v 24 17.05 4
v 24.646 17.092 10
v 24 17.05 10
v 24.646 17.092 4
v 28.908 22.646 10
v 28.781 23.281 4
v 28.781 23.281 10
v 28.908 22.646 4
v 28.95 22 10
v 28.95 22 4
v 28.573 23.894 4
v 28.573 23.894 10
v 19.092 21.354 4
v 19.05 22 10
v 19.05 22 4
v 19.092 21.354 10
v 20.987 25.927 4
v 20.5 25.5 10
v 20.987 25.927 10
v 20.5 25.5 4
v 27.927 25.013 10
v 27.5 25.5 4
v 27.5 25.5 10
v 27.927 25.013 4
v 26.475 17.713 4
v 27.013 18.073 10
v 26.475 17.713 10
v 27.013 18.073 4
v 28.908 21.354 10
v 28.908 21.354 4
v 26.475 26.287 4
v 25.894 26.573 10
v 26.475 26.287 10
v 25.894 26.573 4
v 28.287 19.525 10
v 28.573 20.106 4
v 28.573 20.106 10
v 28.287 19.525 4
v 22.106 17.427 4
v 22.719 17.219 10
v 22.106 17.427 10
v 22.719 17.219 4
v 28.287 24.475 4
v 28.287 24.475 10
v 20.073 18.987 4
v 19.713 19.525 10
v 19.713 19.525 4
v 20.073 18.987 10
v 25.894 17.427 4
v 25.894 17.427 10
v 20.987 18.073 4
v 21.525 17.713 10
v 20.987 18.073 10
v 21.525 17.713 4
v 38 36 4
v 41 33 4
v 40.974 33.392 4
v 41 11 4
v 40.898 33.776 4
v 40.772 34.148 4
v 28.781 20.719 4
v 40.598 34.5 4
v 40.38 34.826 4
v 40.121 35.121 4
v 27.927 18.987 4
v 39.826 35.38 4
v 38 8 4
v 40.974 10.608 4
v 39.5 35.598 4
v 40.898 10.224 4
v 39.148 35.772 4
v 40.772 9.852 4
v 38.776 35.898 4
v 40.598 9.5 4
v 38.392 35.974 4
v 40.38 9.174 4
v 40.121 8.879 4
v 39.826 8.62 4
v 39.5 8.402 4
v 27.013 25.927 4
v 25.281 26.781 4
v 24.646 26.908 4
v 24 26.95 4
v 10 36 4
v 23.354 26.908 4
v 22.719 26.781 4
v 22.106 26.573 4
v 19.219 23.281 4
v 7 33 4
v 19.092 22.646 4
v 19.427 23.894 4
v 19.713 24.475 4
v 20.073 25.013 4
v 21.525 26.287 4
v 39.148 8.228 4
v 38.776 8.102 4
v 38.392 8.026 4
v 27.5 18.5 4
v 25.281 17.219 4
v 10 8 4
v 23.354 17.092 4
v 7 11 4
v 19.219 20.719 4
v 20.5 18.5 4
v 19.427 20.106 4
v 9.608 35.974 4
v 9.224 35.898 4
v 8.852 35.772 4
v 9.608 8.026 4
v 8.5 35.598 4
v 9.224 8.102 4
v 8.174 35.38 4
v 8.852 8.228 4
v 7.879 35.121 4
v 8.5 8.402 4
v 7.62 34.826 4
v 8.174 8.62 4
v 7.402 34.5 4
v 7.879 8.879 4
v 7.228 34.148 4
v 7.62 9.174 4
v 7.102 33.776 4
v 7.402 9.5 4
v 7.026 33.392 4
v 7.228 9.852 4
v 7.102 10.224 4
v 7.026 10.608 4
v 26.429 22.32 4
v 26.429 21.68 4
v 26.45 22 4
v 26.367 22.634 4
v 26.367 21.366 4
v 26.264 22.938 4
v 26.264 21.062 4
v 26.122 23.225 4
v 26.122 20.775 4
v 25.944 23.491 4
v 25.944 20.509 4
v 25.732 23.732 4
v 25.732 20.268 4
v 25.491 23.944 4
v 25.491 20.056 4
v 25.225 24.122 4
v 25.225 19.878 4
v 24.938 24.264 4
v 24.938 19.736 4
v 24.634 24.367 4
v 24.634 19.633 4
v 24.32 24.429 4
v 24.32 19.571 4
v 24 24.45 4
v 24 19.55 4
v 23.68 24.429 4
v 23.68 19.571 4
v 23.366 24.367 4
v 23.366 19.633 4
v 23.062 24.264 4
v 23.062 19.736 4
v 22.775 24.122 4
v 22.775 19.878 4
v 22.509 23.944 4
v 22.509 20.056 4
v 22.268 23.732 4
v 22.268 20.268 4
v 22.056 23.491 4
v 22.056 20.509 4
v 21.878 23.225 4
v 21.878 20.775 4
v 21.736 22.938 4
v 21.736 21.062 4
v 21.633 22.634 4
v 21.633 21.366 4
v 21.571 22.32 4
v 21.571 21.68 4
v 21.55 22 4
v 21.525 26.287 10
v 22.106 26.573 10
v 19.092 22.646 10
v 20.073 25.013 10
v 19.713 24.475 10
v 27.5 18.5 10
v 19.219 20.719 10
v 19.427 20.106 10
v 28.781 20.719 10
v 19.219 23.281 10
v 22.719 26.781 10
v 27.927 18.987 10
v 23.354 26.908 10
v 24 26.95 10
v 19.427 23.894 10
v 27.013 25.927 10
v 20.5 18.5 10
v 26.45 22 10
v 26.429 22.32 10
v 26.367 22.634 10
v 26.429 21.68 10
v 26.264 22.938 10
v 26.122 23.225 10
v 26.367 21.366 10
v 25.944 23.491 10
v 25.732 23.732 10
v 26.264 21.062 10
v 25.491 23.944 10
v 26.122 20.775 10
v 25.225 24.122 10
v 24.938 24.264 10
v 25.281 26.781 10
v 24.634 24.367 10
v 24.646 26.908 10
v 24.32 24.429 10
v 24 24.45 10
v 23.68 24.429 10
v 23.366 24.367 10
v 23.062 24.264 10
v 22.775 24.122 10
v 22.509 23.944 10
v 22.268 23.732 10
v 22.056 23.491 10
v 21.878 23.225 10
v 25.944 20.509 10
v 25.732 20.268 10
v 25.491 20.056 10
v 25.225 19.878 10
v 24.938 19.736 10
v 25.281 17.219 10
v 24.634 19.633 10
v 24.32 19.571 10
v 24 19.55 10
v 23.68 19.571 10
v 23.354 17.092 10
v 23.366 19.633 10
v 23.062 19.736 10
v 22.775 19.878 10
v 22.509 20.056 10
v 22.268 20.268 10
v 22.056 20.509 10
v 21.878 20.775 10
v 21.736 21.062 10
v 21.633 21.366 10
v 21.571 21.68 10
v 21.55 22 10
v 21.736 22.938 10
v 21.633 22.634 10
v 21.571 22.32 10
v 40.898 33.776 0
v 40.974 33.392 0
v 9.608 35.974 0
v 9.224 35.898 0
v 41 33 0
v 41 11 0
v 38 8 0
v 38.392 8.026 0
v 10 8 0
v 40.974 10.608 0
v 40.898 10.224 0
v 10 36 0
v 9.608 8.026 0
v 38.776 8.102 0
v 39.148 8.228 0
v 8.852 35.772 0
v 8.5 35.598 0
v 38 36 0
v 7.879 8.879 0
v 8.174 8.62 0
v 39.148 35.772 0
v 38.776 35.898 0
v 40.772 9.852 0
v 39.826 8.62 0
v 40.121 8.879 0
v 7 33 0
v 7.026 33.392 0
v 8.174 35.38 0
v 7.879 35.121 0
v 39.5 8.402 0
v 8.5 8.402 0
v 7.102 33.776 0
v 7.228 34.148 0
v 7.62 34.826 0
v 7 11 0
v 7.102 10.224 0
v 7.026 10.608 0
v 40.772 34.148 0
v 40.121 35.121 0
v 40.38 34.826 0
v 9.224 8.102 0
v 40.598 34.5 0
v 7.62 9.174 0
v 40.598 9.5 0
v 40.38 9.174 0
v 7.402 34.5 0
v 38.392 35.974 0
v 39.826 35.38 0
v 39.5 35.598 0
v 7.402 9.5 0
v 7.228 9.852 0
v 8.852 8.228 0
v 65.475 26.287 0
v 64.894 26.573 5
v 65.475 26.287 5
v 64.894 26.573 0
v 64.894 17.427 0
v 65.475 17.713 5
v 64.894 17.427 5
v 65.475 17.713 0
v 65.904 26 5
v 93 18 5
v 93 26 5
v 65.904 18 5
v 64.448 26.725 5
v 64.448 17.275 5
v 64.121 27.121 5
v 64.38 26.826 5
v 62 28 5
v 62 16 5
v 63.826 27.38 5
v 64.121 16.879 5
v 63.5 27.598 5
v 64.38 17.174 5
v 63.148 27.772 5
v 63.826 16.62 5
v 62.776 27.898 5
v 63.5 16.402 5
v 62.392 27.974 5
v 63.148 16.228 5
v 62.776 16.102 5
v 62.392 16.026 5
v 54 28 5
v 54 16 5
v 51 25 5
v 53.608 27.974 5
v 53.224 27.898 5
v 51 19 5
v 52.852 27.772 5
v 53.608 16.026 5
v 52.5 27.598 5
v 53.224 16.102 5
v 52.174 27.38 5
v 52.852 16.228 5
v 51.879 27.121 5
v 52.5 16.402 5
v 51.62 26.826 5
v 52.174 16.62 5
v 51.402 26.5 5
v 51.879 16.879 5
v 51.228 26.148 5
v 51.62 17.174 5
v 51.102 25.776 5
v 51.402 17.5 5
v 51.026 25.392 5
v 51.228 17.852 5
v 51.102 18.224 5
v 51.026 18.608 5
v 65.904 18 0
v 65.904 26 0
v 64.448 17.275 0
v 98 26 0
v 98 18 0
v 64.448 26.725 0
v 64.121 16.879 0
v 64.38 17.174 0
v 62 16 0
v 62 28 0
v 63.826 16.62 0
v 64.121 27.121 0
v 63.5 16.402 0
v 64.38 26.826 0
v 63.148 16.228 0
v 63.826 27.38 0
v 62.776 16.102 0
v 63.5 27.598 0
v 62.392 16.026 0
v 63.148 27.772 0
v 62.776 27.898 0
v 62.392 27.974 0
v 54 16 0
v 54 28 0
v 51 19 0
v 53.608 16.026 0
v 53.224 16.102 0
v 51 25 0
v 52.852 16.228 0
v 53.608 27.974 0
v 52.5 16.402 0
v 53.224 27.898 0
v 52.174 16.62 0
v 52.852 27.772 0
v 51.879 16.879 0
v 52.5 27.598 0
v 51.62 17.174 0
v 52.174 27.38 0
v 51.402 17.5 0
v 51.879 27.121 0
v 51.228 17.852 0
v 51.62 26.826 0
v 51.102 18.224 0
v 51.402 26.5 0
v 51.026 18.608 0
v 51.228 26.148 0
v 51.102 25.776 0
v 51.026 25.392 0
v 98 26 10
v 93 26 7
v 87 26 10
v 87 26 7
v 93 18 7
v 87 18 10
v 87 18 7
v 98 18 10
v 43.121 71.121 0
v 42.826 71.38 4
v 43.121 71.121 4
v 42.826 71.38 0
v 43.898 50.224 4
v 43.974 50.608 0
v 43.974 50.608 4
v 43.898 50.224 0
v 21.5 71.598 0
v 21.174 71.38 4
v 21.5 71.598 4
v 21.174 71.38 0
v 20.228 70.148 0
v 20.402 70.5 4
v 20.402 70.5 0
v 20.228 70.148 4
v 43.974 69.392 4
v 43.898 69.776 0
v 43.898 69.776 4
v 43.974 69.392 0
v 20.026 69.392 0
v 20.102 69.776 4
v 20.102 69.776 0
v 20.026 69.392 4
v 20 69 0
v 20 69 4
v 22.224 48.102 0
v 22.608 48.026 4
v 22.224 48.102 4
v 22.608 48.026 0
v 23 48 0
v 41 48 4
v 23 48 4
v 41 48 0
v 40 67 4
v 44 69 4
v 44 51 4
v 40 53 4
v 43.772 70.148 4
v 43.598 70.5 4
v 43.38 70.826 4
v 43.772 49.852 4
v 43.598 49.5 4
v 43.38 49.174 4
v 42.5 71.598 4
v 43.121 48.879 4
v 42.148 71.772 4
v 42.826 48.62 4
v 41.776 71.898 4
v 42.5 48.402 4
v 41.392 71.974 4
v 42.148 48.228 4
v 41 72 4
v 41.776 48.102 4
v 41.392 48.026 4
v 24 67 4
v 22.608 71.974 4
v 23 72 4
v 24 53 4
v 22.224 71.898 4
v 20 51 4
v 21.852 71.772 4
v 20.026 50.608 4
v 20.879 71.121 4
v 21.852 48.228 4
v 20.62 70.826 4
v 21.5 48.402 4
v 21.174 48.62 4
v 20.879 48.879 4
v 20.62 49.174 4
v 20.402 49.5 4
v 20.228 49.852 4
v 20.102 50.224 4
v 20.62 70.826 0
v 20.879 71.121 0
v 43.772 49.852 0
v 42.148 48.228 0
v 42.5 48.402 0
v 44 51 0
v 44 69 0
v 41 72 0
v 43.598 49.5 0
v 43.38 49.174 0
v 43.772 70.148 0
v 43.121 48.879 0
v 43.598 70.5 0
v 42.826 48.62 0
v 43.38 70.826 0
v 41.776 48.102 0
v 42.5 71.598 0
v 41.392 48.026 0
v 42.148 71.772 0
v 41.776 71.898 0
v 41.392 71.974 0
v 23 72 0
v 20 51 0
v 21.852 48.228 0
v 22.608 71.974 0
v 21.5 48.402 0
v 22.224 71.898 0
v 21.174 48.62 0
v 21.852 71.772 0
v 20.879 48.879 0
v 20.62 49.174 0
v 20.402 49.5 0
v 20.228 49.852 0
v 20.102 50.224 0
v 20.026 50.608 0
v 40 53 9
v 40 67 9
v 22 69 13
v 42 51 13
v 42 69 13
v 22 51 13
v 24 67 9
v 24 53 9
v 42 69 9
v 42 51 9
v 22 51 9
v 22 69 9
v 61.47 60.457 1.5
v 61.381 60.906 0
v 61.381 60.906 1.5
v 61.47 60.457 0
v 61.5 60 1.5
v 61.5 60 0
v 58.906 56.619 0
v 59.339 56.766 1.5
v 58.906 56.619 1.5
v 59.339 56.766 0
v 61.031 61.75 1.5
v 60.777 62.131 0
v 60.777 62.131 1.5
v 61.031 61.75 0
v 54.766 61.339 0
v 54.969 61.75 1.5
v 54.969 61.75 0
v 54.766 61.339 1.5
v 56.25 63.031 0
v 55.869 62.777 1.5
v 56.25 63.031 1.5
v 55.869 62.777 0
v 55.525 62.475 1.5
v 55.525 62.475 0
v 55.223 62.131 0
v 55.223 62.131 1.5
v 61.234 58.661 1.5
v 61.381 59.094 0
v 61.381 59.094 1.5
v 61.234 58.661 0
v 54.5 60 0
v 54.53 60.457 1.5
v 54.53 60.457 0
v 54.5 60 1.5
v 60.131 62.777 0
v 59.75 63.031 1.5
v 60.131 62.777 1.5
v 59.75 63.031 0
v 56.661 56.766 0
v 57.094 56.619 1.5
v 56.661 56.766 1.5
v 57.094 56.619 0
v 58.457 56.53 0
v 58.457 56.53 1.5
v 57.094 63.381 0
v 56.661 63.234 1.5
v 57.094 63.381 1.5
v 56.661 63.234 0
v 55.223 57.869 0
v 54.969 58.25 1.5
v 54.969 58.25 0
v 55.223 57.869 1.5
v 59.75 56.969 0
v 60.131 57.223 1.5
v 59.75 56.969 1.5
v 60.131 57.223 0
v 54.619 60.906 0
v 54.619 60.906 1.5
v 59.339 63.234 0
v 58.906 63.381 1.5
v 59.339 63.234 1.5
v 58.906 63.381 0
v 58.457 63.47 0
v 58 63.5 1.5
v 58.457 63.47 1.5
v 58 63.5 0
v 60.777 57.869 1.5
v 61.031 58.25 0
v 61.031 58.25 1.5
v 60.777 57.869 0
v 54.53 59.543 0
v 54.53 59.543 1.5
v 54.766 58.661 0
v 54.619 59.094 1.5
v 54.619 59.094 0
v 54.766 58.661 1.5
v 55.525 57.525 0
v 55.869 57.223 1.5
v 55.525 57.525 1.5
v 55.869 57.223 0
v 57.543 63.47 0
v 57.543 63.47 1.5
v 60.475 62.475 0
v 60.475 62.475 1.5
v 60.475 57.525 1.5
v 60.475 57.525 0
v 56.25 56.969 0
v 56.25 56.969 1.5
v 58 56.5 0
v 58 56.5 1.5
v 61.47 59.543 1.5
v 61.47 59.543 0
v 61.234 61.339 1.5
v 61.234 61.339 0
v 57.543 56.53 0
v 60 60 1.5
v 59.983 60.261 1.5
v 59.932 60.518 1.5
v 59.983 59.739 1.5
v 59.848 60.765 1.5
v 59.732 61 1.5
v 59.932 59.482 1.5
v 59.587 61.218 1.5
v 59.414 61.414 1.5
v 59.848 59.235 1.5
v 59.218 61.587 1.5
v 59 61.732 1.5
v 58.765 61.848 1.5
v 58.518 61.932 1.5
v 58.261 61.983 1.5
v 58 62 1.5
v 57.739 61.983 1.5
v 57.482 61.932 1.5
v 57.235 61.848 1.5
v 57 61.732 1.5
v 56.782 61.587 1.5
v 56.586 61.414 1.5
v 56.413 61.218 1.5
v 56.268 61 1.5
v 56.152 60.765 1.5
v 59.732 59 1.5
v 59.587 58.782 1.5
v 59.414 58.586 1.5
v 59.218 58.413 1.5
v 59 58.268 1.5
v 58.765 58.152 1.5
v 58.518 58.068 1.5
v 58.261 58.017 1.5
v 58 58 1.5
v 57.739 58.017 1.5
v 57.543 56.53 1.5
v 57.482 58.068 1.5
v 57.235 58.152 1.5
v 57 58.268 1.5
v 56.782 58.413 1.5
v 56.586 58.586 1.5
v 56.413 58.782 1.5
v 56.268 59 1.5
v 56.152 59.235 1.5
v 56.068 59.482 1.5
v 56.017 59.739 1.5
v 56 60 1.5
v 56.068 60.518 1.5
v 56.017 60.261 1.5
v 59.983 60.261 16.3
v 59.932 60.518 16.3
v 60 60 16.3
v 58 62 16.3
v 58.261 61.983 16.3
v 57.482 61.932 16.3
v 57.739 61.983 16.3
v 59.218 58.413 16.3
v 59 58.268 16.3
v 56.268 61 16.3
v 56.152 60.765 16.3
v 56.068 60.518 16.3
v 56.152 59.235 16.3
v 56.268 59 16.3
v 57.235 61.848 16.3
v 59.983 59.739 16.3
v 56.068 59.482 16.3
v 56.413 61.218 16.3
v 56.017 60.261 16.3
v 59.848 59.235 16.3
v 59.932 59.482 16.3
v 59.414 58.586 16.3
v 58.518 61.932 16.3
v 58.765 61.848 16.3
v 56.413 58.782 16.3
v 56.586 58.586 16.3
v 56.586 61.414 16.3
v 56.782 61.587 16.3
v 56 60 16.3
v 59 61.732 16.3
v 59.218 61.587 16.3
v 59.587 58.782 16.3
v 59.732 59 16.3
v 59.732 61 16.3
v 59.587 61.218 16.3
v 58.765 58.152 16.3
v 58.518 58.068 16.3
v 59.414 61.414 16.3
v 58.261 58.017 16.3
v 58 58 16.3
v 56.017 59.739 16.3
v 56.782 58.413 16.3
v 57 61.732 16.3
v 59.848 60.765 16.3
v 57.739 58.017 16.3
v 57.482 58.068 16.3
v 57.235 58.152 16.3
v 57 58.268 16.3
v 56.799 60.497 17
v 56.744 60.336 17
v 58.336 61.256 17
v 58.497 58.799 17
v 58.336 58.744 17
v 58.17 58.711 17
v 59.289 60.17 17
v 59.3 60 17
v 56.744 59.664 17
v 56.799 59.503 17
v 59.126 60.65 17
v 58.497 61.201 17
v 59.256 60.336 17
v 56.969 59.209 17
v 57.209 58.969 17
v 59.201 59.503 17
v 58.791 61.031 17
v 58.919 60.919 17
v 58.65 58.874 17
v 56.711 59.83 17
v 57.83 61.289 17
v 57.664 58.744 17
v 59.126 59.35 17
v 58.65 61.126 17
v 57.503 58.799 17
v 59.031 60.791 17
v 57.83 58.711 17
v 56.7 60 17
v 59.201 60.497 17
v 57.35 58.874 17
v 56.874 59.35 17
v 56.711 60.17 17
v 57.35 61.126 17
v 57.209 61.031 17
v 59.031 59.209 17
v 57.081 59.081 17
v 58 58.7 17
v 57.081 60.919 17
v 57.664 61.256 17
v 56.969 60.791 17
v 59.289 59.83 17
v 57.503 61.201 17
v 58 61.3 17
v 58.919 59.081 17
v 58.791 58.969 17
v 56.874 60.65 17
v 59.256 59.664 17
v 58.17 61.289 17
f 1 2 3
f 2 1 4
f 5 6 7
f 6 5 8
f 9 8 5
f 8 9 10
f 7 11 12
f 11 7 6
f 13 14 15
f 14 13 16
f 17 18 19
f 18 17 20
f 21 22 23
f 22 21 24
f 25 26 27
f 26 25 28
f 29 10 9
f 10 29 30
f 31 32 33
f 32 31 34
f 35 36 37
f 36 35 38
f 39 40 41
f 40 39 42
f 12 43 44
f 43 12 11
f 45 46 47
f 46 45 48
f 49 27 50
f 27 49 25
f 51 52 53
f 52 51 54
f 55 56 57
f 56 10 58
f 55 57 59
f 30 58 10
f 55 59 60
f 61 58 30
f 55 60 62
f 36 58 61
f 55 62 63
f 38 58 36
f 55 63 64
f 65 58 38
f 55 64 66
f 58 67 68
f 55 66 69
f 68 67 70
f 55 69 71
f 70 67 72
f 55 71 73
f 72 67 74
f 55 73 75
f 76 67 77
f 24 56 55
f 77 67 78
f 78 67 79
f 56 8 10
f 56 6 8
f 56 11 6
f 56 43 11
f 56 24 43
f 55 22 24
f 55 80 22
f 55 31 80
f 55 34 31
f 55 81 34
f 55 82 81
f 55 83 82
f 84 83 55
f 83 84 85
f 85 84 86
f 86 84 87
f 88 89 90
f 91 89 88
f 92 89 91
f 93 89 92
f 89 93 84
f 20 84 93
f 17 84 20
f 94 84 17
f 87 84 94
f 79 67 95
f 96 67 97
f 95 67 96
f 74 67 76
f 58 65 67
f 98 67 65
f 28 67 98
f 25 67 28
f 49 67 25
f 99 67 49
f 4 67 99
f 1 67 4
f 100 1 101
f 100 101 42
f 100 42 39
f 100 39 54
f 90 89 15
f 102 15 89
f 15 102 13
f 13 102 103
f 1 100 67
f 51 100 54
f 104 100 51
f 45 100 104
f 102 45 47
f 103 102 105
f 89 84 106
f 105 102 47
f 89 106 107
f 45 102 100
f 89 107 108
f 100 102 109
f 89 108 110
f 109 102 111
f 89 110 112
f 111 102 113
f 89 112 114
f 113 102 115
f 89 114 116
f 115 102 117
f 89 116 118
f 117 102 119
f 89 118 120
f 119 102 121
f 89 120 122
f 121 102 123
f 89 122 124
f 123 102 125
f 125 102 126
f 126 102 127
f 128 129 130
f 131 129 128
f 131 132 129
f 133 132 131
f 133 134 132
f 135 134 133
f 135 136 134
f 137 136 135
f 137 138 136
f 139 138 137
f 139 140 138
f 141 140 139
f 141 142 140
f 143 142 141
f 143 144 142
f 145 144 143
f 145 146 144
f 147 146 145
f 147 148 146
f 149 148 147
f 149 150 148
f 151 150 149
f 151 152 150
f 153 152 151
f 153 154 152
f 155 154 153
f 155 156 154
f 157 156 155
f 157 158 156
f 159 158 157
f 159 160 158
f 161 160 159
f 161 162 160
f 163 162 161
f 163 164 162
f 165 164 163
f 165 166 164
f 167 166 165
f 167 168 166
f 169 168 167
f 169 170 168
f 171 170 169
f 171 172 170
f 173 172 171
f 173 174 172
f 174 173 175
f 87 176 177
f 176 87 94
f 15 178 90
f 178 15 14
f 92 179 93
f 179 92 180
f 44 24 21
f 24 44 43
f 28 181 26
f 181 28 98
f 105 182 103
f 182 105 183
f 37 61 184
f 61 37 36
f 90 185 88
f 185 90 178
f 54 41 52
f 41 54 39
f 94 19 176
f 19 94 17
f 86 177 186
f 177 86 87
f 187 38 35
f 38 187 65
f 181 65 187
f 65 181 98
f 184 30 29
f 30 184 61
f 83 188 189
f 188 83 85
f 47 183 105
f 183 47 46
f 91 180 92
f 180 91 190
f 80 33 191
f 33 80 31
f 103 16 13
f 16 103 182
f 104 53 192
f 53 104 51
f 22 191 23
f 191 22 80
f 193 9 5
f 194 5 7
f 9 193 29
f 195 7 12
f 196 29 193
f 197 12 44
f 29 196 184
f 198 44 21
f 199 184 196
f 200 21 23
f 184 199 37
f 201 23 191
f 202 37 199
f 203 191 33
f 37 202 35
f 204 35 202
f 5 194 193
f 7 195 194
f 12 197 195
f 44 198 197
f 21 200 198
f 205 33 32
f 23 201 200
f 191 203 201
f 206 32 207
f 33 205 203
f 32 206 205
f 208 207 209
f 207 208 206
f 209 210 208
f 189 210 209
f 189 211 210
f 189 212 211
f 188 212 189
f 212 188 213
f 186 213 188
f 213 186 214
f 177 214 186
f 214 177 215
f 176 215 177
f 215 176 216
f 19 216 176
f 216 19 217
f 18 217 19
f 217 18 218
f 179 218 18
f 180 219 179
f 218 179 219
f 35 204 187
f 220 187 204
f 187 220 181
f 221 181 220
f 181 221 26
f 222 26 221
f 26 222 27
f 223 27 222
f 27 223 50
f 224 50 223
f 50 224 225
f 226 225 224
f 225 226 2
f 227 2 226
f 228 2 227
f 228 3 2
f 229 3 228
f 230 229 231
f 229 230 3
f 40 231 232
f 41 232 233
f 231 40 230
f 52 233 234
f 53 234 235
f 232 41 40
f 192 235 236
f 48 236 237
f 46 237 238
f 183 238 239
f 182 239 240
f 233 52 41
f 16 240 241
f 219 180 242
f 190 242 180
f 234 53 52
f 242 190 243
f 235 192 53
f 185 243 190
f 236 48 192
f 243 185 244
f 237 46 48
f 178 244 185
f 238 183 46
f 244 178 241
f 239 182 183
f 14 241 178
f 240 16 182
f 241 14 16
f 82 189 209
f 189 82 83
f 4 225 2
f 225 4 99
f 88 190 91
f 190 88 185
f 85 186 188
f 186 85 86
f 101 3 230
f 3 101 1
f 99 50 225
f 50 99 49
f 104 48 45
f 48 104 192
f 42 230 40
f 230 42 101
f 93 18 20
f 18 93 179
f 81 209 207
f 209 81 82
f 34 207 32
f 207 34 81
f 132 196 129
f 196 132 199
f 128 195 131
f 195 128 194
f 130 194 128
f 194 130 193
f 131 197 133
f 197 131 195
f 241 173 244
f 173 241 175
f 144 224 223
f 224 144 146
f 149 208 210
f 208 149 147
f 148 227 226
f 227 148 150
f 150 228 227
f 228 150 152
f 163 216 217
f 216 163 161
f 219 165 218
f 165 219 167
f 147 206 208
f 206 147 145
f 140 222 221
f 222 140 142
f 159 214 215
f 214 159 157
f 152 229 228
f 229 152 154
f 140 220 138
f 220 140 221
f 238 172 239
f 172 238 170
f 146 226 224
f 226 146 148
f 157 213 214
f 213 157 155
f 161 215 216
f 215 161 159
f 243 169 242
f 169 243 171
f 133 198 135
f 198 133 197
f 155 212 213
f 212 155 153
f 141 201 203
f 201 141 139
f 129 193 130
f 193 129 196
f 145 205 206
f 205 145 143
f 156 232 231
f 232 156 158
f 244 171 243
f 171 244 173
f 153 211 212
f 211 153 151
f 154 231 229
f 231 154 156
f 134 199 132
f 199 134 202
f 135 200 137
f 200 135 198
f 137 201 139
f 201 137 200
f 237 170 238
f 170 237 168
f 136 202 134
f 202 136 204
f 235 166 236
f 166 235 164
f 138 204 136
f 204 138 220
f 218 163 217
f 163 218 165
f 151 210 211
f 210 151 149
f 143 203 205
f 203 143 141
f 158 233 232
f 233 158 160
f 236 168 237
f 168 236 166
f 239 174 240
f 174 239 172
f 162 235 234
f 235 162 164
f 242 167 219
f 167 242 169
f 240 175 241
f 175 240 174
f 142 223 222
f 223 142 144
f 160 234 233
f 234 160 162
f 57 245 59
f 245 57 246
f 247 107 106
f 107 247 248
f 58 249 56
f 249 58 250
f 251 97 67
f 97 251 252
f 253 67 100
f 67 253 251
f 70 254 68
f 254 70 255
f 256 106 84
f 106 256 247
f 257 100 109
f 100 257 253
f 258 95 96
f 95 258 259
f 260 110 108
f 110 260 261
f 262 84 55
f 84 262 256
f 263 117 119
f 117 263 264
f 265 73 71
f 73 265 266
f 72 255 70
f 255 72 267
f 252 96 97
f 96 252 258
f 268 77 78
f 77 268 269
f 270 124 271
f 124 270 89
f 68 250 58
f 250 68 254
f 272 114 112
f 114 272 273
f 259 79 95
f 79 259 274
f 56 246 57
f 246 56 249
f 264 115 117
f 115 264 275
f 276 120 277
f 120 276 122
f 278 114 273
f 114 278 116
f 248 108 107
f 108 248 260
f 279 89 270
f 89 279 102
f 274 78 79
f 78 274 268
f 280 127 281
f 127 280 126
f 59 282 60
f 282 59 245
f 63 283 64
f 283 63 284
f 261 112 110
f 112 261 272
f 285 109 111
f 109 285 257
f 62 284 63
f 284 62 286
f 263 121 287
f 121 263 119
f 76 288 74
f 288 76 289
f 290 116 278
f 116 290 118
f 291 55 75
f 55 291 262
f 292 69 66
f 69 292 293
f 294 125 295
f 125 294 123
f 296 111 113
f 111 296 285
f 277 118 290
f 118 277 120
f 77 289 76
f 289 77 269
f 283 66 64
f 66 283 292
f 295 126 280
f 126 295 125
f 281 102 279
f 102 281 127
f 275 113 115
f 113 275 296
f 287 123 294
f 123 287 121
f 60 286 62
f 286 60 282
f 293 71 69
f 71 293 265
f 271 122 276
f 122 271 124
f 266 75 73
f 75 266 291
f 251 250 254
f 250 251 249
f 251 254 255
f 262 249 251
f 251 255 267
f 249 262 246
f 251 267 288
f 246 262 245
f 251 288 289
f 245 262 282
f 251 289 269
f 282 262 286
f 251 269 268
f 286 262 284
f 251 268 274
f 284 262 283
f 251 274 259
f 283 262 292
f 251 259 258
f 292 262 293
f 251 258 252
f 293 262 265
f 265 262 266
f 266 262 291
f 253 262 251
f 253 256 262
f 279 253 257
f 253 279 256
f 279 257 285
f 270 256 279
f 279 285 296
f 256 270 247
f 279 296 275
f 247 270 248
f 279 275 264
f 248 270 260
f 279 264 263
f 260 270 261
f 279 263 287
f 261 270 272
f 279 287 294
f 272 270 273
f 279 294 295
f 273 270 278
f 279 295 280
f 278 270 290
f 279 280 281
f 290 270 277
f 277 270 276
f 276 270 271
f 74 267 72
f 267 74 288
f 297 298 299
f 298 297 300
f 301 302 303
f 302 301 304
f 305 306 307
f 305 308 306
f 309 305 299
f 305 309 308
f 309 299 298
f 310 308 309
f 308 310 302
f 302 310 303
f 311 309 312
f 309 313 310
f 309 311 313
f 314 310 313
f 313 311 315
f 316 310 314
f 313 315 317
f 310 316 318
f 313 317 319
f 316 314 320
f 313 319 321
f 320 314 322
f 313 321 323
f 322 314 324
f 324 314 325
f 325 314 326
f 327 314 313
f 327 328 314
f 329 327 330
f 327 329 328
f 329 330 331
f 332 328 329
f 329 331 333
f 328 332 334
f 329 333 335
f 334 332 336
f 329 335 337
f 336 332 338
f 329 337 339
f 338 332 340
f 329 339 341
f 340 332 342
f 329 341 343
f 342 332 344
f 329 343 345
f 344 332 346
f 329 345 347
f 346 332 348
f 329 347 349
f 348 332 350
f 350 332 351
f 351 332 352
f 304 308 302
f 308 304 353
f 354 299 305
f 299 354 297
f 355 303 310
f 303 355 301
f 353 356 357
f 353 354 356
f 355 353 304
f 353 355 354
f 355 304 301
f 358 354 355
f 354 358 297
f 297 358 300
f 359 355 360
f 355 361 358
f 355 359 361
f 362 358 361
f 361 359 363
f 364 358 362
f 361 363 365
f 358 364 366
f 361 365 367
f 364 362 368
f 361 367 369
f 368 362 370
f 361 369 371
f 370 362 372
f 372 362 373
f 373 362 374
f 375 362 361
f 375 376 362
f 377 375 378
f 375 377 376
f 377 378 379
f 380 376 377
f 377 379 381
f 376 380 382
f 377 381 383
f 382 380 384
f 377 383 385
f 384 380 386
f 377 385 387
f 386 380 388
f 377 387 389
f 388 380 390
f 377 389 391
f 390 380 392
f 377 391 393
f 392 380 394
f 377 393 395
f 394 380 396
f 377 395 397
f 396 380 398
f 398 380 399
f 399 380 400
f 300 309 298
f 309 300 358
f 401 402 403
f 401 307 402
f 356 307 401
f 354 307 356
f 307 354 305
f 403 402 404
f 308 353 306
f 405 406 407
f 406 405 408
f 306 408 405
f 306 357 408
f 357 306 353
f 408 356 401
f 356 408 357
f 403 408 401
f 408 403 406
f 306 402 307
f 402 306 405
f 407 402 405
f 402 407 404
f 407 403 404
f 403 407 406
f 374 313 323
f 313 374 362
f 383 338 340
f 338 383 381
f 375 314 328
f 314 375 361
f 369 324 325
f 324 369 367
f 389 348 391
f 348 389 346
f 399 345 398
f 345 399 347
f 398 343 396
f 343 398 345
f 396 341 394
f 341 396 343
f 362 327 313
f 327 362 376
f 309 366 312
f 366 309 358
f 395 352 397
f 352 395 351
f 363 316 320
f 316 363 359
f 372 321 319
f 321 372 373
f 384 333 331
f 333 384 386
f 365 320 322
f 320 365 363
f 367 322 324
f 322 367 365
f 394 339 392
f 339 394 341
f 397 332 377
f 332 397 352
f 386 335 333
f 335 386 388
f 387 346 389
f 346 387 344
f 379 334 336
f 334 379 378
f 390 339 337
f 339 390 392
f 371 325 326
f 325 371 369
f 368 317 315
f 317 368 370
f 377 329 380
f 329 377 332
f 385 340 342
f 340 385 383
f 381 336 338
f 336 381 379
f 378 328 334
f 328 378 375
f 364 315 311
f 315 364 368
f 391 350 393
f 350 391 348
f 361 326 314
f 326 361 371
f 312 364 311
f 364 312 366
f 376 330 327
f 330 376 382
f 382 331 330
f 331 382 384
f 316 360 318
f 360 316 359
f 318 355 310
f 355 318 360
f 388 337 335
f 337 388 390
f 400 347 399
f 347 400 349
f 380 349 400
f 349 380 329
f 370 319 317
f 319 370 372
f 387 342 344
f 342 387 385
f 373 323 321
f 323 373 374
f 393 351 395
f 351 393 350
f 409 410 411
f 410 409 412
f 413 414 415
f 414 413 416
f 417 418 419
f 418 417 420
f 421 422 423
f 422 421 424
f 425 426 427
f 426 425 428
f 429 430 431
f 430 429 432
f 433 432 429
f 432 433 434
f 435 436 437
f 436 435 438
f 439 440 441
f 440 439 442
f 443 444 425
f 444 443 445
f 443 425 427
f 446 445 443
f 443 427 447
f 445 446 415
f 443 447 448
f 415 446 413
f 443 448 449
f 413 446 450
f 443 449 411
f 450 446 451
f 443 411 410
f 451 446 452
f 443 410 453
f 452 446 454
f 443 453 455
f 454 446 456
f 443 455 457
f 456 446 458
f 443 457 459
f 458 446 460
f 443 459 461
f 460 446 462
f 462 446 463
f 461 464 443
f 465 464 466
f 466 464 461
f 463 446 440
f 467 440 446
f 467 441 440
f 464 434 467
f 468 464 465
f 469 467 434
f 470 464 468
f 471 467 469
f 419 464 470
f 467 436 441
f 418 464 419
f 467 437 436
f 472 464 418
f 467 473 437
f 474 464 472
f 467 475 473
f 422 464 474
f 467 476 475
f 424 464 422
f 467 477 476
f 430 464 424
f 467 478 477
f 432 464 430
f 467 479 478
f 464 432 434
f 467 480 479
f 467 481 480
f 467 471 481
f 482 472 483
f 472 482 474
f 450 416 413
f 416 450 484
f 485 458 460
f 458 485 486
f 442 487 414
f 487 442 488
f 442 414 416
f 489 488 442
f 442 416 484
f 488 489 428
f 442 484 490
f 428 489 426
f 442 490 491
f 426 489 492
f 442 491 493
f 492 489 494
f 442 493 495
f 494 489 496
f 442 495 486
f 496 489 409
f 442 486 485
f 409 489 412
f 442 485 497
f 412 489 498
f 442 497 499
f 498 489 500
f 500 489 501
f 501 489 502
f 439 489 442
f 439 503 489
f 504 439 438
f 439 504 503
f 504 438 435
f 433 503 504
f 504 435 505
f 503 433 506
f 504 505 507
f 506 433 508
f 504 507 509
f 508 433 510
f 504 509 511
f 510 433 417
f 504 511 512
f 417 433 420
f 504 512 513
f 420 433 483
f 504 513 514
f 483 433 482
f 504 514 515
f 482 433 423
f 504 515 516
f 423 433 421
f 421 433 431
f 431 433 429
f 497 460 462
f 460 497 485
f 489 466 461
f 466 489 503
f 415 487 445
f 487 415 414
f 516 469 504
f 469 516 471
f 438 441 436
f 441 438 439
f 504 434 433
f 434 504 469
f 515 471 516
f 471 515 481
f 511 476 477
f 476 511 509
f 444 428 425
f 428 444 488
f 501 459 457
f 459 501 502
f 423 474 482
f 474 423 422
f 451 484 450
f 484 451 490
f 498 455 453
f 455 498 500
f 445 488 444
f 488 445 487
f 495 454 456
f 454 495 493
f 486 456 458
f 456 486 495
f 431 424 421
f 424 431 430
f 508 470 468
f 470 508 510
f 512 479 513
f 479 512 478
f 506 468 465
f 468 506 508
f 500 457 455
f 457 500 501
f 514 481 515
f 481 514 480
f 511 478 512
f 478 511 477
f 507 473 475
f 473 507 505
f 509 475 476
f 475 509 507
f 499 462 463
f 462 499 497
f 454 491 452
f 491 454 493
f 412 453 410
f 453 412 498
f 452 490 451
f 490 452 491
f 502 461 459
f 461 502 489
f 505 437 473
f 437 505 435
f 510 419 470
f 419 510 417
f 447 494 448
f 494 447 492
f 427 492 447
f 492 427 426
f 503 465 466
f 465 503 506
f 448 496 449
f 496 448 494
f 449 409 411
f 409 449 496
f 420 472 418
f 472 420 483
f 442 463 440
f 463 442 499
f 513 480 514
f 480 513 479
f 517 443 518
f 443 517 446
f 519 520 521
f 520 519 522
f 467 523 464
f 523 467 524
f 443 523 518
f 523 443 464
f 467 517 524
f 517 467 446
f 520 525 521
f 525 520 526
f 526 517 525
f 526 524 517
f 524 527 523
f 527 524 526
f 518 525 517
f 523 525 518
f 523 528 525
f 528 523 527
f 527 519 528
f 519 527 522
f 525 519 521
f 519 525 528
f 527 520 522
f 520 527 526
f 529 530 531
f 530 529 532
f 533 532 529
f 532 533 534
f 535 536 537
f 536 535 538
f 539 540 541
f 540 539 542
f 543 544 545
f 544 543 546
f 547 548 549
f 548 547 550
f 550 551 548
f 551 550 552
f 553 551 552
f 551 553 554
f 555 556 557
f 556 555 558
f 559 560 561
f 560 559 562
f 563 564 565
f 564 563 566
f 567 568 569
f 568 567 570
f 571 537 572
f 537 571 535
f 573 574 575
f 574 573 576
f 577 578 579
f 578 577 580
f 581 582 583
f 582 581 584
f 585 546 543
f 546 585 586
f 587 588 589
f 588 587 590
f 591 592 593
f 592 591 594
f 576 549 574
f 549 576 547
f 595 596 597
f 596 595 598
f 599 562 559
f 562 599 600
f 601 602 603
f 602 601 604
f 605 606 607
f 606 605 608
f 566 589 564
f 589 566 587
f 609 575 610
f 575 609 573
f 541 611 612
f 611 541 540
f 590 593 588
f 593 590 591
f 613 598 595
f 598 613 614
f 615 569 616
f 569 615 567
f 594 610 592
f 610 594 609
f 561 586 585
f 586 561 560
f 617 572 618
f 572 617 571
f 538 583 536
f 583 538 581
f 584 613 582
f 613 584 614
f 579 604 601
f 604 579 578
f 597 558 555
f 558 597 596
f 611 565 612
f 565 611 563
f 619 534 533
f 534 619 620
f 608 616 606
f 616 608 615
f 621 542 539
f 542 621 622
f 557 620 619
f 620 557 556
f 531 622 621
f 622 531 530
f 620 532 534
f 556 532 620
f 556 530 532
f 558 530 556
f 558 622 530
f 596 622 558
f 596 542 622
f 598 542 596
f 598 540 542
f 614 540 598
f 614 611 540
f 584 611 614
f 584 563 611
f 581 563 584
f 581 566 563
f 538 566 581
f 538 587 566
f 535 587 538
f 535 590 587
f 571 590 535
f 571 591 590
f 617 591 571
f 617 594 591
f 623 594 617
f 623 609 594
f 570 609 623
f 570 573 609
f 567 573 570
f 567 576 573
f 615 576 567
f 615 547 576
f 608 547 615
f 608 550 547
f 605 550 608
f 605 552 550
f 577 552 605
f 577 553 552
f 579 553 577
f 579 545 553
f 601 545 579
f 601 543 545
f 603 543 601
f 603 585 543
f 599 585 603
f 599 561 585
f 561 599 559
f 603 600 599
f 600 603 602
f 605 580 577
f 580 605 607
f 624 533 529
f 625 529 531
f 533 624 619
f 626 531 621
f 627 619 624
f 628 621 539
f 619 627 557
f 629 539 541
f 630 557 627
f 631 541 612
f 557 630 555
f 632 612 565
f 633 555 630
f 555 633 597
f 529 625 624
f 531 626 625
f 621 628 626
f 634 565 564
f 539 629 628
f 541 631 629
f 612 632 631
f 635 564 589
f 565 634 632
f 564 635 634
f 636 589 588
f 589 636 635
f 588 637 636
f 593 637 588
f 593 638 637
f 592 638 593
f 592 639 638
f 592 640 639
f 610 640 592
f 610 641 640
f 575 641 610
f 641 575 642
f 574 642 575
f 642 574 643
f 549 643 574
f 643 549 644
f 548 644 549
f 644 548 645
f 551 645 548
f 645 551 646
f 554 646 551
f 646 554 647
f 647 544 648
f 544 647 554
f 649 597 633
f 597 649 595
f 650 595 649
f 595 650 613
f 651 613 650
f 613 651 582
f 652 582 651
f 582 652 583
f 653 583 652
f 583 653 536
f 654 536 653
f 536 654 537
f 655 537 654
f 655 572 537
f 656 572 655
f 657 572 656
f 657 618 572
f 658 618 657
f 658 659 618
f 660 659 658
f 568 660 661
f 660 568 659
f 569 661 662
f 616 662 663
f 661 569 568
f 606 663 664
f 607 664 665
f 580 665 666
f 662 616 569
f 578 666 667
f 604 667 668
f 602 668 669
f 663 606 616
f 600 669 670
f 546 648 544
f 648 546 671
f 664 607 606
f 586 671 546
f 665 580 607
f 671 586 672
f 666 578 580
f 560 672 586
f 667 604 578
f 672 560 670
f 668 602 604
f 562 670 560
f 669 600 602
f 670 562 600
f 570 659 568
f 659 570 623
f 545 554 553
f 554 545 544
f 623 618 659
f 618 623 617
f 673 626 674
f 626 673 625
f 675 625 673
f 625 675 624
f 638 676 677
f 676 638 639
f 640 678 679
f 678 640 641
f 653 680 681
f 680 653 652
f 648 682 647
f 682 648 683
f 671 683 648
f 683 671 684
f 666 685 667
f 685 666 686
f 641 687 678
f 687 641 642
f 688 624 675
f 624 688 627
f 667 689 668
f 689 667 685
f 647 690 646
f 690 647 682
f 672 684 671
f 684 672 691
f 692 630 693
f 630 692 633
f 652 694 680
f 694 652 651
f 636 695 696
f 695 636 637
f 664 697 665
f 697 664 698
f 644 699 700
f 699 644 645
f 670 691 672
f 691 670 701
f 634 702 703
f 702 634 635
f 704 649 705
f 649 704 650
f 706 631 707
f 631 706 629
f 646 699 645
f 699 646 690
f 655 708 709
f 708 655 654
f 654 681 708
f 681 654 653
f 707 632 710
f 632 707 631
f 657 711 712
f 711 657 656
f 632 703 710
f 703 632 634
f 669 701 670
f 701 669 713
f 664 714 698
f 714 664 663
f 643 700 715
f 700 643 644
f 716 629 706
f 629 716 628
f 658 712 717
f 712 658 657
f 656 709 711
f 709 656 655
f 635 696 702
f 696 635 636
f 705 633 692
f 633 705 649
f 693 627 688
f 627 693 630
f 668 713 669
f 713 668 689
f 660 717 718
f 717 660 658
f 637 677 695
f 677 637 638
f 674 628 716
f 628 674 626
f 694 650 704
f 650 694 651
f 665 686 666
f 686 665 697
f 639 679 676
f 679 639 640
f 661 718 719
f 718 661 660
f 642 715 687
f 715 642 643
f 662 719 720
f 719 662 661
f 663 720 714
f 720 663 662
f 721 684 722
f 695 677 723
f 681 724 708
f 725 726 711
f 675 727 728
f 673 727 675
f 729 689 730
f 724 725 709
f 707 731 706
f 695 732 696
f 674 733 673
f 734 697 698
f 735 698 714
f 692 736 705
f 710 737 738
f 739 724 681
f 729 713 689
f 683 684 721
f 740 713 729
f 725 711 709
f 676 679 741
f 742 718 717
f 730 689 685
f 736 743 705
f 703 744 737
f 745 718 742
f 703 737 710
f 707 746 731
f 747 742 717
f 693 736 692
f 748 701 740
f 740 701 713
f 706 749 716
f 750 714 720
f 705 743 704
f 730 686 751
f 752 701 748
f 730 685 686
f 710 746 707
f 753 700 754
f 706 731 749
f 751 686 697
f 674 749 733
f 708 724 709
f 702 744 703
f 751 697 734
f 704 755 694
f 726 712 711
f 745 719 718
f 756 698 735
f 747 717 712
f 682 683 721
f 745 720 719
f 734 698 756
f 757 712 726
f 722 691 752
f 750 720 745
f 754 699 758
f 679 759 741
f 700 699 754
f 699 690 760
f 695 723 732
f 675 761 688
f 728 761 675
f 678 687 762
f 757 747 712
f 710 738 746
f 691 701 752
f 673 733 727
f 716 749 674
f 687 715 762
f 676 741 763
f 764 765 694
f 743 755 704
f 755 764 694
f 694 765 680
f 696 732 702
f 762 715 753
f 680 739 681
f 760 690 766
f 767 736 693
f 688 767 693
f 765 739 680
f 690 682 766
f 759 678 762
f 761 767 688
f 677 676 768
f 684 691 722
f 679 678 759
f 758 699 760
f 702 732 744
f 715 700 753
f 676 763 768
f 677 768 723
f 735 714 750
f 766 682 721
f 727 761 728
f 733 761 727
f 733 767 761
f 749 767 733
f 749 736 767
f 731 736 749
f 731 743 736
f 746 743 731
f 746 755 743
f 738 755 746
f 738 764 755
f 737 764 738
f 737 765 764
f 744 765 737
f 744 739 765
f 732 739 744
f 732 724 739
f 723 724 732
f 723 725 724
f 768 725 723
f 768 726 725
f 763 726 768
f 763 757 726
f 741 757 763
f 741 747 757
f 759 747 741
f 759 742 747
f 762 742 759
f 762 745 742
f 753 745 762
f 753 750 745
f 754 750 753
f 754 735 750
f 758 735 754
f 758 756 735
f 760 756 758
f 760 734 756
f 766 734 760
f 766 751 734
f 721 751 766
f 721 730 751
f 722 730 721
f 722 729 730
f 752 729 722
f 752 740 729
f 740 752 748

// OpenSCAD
/*
Sample 076: Drehhakenverschluss — 0,45 mm
Generated from the FDM Mechanical Sample Library.
Units: millimetres.

Override examples:
  openscad -o custom.stl -D 'view="plate"' -D 'render_fn=64' model.scad
  openscad -o preview.png -D 'view="assembly"' model.scad
*/
use <../../../library/fdm_mechanisms.scad>

render_fn = is_undef(render_fn) ? 48 : render_fn;
view = is_undef(view) ? "plate" : view;
$fn = render_fn;

sample_hook_latch(
    view=view,
    pin_d=4,
    clearance=0.45,
    arm=34
);
